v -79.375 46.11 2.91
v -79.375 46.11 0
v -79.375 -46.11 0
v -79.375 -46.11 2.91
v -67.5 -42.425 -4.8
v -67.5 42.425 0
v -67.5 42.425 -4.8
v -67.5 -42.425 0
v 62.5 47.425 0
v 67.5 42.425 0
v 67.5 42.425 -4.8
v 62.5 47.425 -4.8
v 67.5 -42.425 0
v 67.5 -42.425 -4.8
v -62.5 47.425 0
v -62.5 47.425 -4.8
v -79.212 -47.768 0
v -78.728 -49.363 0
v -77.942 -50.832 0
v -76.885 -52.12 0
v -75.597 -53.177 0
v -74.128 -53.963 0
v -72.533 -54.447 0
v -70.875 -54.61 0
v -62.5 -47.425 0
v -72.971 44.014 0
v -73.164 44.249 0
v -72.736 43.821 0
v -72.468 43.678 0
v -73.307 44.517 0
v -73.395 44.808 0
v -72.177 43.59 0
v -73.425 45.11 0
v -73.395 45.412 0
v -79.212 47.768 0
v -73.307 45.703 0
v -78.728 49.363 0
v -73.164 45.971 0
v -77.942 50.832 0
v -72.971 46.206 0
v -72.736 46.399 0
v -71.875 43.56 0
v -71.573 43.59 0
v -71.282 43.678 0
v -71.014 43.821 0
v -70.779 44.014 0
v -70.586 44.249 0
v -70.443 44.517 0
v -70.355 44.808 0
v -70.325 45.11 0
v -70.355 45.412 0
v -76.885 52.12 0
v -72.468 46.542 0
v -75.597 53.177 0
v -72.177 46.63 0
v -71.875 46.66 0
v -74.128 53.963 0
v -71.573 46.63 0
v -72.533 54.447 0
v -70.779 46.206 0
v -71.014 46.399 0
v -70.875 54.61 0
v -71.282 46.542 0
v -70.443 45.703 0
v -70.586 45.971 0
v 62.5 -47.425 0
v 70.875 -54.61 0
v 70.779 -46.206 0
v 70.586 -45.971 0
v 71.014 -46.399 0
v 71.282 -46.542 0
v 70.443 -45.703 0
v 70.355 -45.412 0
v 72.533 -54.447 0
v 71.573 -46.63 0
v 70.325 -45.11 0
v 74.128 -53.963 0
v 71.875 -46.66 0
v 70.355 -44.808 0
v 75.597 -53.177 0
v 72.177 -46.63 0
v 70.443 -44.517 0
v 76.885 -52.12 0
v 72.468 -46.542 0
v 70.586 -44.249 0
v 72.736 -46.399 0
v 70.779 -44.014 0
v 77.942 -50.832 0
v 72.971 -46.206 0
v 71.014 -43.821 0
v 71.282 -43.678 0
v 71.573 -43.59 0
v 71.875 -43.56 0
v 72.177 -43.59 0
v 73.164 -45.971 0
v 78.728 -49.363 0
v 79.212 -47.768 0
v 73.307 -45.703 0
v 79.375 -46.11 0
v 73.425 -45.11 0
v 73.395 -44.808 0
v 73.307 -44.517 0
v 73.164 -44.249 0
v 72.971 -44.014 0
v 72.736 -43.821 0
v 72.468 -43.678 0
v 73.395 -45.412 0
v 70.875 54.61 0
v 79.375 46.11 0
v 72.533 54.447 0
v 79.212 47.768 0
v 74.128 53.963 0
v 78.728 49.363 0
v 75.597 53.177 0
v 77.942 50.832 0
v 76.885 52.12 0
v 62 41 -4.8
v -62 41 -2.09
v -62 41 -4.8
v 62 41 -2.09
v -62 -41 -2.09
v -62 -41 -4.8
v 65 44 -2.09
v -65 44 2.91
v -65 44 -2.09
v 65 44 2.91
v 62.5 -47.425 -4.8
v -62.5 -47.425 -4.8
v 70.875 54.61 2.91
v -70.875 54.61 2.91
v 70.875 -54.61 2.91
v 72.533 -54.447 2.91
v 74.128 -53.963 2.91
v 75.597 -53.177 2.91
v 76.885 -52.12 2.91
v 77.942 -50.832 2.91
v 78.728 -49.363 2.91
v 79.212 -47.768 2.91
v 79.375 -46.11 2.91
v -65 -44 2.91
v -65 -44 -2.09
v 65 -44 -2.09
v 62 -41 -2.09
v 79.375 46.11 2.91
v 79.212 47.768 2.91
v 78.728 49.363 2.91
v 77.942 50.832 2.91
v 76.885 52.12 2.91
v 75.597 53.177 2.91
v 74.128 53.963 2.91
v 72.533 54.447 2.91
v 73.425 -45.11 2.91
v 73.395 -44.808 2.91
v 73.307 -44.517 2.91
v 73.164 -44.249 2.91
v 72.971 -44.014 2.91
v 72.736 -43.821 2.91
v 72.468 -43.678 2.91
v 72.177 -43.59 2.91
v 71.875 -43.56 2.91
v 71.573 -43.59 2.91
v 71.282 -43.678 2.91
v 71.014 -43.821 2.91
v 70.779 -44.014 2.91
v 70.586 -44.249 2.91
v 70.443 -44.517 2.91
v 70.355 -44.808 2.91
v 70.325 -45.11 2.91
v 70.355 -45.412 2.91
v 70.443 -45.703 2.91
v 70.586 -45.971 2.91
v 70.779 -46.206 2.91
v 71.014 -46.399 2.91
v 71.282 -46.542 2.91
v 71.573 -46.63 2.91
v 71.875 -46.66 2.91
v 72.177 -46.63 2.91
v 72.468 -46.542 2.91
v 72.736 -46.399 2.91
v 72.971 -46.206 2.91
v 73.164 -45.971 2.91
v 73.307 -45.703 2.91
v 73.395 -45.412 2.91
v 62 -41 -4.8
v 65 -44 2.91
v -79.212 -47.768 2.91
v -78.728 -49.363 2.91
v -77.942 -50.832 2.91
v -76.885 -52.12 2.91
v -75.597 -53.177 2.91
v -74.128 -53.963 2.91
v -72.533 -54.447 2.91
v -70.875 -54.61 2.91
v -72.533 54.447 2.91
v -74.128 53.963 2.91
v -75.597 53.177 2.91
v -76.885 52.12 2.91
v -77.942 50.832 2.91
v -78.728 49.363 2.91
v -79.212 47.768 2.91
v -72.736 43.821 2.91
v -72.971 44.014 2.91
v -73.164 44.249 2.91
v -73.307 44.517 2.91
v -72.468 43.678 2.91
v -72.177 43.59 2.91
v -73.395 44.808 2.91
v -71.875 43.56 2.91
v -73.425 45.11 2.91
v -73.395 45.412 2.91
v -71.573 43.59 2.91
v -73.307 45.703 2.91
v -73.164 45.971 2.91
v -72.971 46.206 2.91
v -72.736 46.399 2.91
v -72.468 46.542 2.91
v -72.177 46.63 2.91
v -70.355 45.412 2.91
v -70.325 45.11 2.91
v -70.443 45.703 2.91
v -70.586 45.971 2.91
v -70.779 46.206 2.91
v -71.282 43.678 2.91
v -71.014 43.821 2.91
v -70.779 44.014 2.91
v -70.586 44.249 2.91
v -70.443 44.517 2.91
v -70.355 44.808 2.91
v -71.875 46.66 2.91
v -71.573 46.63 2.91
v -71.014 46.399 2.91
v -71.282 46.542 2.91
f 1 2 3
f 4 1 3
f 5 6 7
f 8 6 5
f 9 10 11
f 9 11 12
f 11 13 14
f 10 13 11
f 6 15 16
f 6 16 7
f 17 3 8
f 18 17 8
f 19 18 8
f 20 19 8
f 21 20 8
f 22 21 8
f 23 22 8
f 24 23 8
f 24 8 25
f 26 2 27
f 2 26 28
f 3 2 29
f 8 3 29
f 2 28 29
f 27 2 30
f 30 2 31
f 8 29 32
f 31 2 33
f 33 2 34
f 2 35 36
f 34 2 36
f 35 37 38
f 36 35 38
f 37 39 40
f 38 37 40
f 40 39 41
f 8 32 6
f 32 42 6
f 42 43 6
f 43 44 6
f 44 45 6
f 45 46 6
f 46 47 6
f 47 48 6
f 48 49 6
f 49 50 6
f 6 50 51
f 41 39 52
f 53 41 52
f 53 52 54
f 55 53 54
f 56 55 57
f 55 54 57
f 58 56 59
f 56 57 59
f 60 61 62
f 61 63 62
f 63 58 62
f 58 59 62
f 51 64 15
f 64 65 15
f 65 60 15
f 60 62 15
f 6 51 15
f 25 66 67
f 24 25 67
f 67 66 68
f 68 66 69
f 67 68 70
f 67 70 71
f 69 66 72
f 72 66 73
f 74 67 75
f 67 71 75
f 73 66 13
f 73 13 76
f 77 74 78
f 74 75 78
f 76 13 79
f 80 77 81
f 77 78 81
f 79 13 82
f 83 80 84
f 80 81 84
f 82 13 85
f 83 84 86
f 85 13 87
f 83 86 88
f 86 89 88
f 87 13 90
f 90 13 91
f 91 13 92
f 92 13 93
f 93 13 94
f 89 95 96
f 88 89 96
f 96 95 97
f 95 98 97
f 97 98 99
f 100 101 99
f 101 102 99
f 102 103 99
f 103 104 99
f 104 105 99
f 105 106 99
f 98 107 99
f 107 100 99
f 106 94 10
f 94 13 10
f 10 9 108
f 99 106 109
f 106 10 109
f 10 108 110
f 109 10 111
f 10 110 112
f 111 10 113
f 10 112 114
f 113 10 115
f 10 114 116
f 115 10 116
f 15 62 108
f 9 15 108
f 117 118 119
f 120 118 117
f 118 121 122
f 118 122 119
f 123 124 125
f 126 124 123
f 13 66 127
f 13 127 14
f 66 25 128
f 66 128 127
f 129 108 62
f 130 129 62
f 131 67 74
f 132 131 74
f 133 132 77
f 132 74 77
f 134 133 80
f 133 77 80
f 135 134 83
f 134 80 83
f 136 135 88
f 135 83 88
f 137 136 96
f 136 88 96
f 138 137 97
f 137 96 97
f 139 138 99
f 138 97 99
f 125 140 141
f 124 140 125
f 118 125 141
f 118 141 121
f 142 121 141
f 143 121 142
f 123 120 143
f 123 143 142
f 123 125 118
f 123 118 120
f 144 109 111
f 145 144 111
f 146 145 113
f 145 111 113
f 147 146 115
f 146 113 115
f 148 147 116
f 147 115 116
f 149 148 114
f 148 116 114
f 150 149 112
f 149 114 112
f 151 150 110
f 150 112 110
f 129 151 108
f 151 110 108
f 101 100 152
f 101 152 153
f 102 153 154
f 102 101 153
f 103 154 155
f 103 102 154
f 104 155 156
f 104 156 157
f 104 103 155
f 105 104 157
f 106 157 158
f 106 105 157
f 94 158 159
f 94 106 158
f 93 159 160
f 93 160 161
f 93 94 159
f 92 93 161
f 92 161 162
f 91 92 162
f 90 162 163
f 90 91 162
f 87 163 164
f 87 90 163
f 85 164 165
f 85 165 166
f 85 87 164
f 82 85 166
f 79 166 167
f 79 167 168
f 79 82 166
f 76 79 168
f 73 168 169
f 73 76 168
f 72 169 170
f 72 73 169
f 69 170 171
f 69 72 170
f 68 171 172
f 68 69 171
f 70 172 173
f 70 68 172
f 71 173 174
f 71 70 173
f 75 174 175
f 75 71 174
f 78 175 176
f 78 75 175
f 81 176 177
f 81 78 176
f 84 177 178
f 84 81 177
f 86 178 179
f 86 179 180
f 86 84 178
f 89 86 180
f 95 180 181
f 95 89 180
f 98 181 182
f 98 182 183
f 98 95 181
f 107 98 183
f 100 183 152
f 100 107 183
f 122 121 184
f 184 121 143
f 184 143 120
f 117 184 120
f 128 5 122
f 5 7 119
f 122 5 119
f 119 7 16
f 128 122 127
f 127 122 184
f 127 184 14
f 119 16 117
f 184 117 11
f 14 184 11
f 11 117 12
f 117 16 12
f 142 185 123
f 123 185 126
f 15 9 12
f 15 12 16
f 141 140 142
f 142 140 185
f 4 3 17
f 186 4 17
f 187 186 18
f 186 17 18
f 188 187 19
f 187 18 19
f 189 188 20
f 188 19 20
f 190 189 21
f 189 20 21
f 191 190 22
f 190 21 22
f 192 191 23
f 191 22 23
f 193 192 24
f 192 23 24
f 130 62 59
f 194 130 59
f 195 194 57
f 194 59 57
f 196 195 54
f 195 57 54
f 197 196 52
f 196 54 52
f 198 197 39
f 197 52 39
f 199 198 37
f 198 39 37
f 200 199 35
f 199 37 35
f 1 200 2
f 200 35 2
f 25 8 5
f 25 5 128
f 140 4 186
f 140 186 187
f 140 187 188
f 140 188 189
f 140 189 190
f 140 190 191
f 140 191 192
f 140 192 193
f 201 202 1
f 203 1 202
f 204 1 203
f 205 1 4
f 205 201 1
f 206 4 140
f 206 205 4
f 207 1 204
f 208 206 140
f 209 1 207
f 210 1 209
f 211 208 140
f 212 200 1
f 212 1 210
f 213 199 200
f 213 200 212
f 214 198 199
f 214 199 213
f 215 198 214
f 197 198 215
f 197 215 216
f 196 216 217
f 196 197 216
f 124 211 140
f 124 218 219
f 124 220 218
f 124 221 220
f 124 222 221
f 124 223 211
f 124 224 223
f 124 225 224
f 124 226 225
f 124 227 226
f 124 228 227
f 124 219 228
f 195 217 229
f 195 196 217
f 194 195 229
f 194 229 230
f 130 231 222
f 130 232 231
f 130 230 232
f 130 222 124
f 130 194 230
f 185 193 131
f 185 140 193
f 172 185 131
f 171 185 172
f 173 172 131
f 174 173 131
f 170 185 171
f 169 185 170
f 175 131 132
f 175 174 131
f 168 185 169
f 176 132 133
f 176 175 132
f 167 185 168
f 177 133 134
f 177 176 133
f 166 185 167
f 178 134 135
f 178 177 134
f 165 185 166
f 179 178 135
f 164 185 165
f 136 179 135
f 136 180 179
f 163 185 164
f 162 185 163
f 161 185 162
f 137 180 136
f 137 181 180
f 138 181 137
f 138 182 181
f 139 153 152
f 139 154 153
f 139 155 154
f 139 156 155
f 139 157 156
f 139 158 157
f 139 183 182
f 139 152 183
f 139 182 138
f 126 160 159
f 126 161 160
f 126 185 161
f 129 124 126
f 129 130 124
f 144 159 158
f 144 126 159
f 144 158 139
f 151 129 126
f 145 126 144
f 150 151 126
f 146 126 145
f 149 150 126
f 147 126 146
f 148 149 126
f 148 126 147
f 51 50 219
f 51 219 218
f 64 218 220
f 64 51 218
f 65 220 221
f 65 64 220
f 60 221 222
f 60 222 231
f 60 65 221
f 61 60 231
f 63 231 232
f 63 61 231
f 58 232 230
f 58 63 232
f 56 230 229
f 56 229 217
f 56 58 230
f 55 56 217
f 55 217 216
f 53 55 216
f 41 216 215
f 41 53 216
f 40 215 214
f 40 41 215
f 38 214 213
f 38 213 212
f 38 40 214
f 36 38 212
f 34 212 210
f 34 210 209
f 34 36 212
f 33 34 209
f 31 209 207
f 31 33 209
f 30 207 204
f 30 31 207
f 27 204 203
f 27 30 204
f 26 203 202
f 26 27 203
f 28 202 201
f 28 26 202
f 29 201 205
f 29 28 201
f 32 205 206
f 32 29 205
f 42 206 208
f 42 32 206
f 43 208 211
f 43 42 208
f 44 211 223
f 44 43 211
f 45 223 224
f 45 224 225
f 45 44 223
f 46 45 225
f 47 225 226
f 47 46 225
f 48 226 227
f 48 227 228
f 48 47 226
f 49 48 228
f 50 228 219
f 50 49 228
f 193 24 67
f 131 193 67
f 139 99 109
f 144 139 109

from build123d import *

# Parameters (mm, degrees)
F0_R     = 1.55
F1_DEPTH = 2.91
F3_DEPTH = 4.8
F4_W     = 130
F4_H     = 88
F4_W_2   = 124
F4_H_2   = 82
F5_DEPTH = 5
F6_DEPTH = 25


with BuildPart() as f1:
    # F0 (on Top) → F1 (new body)
    with BuildSketch(Plane.XY):
        with BuildLine():
            Line((-70.875, -54.61), (70.875, -54.61))
            ThreePointArc((70.875, -54.61), (76.885408, -52.120408), (79.375, -46.11))
            Line((79.375, -46.11), (79.375, 46.11))
            ThreePointArc((79.375, 46.11), (76.885408, 52.120408), (70.875, 54.61))
            Line((70.875, 54.61), (-70.875, 54.61))
            ThreePointArc((-70.875, 54.61), (-76.885408, 52.120408), (-79.375, 46.11))
            Line((-79.375, 46.11), (-79.375, -46.11))
            ThreePointArc((-79.375, -46.11), (-76.885408, -52.120408), (-70.875, -54.61))
        make_face()
        with Locations((71.875, -45.11)):
            Circle(F0_R, mode=Mode.SUBTRACT)
        with Locations((-71.875, 45.11)):
            Circle(F0_R, mode=Mode.SUBTRACT)
    extrude(amount=F1_DEPTH)

    # F2 (on Top) → F3 (join)
    with BuildSketch(Plane.XY):
        Polygon((-62.5, -47.425), (62.5, -47.425), (67.5, -42.425), (67.5, 42.425), (62.5, 47.425), (-62.5, 47.425), (-67.5, 42.425), (-67.5, -42.425), align=None)
    extrude(amount=-F3_DEPTH)

    # F4 (on face) → F5 (cut)
    with BuildSketch(Plane.XY.offset(2.91)):
        Rectangle(F4_W, F4_H)
        Rectangle(F4_W_2, F4_H_2, mode=Mode.SUBTRACT)
        Rectangle(F4_W_2, F4_H_2)
    extrude(amount=-F5_DEPTH, mode=Mode.SUBTRACT)

    # F4 (on face) → F6 (cut)
    with BuildSketch(Plane.XY.offset(2.91)):
        Rectangle(F4_W_2, F4_H_2)
    extrude(amount=-F6_DEPTH, mode=Mode.SUBTRACT)


solid = f1.part
